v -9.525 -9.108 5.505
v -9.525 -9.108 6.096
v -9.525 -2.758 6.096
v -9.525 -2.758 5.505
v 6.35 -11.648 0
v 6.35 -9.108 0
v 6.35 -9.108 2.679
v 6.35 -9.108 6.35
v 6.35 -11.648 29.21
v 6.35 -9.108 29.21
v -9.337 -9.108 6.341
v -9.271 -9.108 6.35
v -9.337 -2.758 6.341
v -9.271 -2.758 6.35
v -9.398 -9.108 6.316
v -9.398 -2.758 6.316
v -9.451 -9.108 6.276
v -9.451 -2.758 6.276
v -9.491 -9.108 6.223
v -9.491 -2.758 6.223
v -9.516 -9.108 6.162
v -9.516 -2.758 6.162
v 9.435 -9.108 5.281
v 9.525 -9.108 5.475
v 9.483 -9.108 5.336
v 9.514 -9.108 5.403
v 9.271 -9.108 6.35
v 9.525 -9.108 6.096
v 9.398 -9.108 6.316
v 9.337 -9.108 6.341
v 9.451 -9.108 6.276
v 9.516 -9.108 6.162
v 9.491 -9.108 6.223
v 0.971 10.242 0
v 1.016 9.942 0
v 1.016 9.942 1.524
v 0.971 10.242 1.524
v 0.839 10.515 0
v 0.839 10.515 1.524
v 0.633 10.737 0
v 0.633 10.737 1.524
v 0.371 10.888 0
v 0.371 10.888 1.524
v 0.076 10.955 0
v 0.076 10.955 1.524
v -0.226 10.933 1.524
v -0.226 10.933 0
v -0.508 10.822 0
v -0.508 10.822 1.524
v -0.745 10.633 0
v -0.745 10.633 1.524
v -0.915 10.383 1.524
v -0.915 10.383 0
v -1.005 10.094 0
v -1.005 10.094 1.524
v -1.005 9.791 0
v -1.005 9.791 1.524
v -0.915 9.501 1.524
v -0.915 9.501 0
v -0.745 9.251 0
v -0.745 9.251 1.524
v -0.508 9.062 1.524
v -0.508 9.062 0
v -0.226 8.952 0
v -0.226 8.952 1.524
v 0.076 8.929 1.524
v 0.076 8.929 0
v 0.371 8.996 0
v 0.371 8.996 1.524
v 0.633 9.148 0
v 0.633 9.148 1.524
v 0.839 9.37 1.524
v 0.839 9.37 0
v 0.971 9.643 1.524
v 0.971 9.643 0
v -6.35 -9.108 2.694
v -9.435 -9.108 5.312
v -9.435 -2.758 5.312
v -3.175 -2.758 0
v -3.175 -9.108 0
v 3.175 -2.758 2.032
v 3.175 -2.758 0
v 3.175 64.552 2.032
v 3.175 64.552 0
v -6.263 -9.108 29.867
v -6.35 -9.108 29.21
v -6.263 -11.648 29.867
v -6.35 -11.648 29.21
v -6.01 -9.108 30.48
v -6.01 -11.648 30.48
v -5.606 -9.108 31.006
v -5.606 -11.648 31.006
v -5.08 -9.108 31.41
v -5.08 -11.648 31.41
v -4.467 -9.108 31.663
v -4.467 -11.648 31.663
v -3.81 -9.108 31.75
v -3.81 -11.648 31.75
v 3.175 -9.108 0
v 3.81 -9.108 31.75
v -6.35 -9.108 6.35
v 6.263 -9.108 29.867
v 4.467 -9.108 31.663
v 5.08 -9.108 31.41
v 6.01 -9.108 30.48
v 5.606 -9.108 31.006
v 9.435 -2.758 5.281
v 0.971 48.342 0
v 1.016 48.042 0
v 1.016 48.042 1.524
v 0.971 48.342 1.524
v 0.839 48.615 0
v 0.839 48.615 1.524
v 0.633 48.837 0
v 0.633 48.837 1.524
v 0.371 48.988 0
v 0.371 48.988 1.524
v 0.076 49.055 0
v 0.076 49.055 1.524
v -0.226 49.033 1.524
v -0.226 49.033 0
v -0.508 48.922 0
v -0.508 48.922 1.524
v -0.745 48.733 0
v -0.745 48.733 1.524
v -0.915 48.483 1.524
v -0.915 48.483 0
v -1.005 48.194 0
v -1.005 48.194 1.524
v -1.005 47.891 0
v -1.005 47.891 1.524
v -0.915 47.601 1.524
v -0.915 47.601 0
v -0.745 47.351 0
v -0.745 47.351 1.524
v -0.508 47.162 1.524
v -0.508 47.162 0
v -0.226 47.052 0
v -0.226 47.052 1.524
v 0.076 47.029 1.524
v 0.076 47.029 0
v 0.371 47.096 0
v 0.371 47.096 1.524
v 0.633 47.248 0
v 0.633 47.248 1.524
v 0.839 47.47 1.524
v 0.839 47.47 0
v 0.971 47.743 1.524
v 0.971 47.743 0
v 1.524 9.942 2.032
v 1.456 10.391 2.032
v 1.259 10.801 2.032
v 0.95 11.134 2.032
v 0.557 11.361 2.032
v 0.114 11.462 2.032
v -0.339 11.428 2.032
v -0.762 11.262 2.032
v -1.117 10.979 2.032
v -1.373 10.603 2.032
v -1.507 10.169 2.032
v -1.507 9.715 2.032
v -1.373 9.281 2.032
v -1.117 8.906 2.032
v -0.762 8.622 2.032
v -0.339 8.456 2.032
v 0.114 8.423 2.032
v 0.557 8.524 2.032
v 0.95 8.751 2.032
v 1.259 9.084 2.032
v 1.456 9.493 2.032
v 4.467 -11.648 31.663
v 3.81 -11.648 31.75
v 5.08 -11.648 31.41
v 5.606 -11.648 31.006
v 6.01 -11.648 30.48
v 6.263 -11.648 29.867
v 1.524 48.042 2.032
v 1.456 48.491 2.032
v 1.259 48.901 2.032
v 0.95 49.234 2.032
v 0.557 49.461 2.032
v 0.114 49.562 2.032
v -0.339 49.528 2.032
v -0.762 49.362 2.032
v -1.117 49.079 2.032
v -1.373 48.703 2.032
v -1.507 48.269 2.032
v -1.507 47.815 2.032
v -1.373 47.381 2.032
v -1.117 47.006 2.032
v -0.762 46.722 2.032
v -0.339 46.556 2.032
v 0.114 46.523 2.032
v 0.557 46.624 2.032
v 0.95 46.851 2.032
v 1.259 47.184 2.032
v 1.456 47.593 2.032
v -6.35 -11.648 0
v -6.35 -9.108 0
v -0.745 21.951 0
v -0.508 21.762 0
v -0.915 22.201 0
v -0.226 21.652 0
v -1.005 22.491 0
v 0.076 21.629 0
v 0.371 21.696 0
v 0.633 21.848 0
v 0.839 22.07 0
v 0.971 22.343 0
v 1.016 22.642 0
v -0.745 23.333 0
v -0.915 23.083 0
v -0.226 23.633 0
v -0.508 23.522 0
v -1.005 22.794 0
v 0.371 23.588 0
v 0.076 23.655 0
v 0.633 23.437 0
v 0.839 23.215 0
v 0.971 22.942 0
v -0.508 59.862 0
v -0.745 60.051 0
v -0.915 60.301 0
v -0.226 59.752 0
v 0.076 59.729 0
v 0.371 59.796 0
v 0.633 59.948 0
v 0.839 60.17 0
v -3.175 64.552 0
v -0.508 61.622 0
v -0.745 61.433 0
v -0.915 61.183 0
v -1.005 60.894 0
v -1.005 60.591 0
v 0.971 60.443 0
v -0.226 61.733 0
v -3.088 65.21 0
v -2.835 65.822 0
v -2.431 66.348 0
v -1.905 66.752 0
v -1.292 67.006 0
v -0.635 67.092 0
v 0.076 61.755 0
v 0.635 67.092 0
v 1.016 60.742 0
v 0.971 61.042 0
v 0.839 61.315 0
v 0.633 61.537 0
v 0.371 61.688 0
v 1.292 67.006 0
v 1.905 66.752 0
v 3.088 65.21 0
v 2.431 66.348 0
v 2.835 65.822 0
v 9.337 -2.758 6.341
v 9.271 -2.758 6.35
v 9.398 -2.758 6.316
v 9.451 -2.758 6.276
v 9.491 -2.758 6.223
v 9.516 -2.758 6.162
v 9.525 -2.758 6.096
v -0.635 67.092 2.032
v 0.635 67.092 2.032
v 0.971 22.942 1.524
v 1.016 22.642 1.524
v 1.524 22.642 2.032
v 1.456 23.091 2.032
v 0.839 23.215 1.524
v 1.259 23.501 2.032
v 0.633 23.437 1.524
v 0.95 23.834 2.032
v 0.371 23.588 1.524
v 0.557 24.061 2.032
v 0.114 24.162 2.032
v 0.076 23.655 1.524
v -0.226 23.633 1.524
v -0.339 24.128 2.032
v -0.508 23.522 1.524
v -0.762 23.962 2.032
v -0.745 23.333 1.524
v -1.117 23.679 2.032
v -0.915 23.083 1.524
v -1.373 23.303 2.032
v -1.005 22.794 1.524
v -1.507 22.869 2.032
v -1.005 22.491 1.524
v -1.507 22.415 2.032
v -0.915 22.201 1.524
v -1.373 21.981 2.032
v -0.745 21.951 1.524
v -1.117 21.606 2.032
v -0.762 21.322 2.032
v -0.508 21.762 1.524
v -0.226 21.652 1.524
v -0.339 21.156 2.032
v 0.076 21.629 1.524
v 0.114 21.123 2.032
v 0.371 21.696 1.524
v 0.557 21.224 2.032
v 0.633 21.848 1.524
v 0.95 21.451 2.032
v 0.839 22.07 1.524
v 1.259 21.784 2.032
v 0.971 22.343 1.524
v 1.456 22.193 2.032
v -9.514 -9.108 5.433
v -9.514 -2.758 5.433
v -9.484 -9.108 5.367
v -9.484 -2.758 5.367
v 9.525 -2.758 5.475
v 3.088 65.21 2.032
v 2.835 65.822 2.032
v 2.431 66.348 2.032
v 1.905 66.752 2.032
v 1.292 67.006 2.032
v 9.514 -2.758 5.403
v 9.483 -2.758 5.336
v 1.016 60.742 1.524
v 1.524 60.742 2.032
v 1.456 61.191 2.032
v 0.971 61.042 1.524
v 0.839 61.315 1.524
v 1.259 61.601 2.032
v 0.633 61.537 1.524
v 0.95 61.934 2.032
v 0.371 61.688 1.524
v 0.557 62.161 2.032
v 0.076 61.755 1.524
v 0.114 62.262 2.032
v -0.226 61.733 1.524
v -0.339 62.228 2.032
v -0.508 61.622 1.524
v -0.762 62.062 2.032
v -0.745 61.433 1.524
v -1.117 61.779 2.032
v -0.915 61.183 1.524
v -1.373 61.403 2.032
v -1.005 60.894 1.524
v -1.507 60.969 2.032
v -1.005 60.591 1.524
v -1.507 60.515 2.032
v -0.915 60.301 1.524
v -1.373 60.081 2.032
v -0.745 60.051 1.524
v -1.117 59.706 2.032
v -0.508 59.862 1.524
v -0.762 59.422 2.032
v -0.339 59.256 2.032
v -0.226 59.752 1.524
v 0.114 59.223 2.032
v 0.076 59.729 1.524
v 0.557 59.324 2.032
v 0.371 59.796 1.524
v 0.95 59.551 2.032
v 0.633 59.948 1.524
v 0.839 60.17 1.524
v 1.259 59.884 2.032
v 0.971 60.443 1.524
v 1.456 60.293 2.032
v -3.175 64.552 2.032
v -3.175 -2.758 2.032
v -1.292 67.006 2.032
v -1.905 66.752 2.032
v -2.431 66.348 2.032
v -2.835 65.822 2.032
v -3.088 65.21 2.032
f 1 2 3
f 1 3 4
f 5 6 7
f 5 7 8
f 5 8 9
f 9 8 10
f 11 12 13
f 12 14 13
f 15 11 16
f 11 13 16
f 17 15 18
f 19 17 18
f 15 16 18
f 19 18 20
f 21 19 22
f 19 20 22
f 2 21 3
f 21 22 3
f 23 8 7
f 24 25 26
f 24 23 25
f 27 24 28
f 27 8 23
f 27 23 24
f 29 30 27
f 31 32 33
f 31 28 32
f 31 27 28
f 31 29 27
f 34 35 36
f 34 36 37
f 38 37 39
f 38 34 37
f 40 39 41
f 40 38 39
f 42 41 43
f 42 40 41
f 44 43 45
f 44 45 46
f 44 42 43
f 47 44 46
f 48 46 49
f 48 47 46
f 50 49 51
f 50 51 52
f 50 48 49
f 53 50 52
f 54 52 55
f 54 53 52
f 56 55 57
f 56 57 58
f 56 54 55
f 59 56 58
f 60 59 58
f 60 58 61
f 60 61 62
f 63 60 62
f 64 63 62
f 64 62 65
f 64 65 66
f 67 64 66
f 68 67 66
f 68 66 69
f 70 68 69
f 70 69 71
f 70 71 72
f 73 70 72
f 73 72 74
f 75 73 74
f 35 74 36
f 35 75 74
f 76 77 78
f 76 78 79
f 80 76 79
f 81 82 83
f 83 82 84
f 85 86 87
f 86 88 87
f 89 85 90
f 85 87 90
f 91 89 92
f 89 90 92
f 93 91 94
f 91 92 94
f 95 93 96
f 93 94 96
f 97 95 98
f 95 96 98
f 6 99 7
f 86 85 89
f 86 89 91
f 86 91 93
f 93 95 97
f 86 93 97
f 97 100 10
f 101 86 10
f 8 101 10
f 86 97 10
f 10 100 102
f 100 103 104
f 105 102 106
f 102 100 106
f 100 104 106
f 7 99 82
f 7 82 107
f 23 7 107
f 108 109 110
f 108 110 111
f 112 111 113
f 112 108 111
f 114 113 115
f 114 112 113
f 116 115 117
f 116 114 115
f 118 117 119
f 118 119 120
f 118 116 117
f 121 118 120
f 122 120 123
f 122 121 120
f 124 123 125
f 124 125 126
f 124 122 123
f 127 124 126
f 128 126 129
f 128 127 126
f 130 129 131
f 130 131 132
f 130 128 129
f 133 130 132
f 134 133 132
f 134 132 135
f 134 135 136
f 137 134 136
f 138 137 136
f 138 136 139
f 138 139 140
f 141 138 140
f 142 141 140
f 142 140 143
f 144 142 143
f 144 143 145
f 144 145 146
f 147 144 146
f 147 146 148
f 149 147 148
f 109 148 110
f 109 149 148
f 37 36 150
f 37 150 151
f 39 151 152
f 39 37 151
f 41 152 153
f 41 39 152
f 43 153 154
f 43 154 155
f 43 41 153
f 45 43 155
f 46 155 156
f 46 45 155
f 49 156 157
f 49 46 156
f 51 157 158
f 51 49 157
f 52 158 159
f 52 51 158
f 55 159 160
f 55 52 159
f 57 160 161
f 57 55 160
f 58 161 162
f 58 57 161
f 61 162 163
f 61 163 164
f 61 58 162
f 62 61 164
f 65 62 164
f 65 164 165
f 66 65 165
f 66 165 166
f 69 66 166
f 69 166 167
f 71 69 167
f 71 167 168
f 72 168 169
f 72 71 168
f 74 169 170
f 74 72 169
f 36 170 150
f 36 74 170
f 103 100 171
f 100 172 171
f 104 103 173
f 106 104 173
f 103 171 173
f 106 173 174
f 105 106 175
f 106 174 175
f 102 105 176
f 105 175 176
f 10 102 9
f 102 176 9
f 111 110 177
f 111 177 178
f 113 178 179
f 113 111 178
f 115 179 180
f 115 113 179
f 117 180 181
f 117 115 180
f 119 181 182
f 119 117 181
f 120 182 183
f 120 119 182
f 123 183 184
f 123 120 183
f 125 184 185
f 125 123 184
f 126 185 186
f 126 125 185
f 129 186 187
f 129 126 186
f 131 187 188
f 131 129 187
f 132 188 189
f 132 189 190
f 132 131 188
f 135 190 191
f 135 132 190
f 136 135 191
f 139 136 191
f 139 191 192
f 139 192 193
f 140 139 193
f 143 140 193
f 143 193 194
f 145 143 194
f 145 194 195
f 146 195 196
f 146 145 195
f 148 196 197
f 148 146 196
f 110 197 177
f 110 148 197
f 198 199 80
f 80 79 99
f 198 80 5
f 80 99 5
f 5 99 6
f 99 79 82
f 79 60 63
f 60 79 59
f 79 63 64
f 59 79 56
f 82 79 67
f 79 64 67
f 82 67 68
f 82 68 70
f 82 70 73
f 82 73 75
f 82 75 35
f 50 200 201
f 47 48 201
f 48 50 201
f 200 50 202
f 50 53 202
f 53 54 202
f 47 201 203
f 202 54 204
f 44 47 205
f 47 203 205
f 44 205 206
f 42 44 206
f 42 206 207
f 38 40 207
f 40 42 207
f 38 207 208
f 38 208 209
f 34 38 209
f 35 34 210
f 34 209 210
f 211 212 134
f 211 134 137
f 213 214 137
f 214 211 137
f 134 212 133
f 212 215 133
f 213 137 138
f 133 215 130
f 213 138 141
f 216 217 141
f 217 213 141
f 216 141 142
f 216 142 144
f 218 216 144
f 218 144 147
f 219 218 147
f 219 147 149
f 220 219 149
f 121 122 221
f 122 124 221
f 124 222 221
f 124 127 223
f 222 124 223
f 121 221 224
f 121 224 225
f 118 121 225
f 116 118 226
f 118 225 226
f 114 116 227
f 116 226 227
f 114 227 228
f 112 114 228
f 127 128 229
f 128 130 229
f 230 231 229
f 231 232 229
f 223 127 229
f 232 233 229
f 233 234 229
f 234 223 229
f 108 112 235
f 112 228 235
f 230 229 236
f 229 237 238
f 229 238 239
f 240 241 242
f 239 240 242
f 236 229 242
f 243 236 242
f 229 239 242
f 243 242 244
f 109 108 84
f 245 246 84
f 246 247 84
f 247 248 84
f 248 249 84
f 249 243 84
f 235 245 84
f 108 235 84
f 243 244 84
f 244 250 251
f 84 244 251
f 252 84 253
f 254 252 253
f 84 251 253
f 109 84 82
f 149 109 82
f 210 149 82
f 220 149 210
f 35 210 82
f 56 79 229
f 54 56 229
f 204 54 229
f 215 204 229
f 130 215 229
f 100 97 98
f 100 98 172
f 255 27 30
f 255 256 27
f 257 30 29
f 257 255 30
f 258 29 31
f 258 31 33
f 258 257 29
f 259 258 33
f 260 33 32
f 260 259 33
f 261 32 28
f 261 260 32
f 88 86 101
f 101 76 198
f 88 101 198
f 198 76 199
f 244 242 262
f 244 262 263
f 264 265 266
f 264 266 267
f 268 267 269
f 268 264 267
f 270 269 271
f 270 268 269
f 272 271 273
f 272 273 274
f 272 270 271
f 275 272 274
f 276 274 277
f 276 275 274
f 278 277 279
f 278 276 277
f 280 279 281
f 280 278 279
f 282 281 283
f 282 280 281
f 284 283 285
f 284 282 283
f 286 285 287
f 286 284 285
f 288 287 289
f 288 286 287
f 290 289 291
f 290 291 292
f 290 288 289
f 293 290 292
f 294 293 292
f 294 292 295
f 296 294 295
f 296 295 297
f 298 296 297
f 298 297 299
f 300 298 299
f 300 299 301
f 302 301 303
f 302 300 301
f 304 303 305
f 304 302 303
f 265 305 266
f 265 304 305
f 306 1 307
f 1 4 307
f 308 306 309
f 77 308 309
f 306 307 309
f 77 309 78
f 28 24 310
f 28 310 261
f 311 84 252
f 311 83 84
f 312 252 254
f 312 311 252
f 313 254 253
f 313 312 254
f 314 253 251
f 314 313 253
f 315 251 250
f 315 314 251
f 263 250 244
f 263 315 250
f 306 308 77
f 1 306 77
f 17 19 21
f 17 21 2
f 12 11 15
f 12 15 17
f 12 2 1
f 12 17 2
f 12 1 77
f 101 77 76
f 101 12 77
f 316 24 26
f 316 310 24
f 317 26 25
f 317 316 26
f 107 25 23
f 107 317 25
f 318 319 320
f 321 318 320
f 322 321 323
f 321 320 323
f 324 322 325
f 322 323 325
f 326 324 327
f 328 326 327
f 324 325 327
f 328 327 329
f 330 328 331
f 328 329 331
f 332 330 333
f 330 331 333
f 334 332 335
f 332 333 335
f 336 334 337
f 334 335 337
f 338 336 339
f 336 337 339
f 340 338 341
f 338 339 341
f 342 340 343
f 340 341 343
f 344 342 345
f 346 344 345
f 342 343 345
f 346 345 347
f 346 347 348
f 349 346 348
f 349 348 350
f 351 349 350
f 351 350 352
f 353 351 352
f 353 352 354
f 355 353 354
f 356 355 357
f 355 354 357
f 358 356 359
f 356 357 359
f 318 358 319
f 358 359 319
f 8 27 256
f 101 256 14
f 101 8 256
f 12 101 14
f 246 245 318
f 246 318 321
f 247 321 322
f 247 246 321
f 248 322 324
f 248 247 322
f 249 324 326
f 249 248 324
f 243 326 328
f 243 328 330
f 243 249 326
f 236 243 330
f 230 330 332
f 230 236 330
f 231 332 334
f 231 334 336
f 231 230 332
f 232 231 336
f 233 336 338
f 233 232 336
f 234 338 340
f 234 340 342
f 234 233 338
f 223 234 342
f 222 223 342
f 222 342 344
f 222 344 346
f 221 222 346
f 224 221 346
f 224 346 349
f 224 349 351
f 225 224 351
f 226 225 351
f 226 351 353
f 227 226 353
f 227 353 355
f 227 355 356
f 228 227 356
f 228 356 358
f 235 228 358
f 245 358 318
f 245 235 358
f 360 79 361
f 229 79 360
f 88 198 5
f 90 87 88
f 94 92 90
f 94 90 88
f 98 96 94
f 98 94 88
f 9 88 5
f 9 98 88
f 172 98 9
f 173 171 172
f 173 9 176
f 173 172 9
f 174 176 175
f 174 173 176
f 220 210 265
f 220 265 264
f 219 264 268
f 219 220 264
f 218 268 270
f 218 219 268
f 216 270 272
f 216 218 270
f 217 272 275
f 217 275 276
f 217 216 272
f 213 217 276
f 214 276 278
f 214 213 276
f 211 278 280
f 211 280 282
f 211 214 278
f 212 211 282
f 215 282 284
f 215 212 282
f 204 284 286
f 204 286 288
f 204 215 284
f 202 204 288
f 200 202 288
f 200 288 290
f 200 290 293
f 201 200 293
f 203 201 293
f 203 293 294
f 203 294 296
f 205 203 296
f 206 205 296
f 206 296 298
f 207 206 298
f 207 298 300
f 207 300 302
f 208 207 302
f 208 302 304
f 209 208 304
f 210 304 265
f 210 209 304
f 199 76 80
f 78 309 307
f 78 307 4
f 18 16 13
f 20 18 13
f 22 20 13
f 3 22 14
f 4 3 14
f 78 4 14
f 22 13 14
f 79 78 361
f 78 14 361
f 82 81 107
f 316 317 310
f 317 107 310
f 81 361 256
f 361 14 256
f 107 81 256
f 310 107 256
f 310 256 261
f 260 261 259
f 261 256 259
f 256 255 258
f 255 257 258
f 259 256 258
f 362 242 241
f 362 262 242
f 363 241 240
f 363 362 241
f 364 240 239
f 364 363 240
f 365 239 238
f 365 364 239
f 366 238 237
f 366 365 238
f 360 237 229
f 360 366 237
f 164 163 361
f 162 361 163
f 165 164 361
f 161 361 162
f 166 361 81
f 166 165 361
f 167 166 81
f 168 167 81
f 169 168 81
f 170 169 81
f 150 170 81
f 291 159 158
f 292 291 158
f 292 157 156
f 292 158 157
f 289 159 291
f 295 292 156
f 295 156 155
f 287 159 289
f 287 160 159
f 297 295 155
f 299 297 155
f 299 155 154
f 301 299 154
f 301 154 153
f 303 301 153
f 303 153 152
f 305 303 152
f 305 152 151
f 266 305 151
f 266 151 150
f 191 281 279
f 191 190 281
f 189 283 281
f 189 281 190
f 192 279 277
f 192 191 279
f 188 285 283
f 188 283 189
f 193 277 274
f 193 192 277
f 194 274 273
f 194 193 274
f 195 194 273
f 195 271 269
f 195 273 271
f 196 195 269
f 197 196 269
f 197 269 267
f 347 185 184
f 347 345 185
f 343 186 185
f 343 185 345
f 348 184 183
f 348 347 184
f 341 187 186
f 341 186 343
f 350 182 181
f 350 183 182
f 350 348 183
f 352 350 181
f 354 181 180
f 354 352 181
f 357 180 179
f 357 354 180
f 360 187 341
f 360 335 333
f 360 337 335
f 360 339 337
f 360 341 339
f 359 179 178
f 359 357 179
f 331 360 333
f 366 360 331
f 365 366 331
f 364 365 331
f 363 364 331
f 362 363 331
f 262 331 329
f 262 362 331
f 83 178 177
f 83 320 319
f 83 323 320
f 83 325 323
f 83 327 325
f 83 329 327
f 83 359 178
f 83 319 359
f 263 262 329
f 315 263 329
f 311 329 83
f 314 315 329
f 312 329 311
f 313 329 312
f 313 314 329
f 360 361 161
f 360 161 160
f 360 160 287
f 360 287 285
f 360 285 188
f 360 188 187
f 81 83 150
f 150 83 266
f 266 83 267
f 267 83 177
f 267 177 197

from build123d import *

# Parameters (mm, degrees)
F0_W     = 6.35
F0_H     = 76.2
F0_R     = 1.016
F1_DEPTH = 2.032
F3_DEPTH = 6.35
F4_R     = 0.254
F5_R     = 0.254
F6_SIZE  = 0.508
F7_SIZE  = 0.508
F8_W     = 12.7
F8_H     = 25.4
F9_DEPTH = 2.54
F10_R    = 2.54
F11_R    = 2.54


with BuildPart() as f1:
    # F0 (on Top) → F1 (new body)
    with BuildSketch(Plane.XY):
        with Locations((0, 28.9922469051)):
            Rectangle(F0_W, F0_H)
        with Locations((0, 9.9422469051)):
            Circle(F0_R, mode=Mode.SUBTRACT)
        with Locations((0, 22.6422469051)):
            Circle(F0_R, mode=Mode.SUBTRACT)
        with Locations((0, 48.0422469051)):
            Circle(F0_R, mode=Mode.SUBTRACT)
        with Locations((0, 60.7422469051)):
            Circle(F0_R, mode=Mode.SUBTRACT)
    extrude(amount=F1_DEPTH)

    # F2 (on face) → F3 (join)
    with BuildSketch(Plane.XZ.offset(9.1077530949)):
        Polygon((-9.525, 5.3878031066), (-3.175, 0), (3.175, 0), (9.525, 5.3573960435), (9.525, 6.35), (3.175, 6.35), (-3.175, 6.35), (-9.525, 6.35), align=None)
    extrude(amount=-F3_DEPTH)

    # F4
    f4_edges = [f1.edges().sort_by_distance(p)[0] for p in [
        (9.525, -5.932753, 6.35),
    ]]
    fillet(f4_edges, radius=F4_R)

    # F5
    f5_edges = [f1.edges().sort_by_distance(p)[0] for p in [
        (9.525, -5.932753, 5.357396),
        (-9.525, -5.932753, 6.35),
        (-9.525, -5.932753, 5.387803),
    ]]
    fillet(f5_edges, radius=F5_R)

    # F6
    f6_edges = [f1.edges().sort_by_distance(p)[0] for p in [
        (-1.016, 60.742247, 2.032),
    ]]
    chamfer(f6_edges, length=F6_SIZE)

    # F7
    f7_edges = [f1.edges().sort_by_distance(p)[0] for p in [
        (-1.016, 48.042247, 2.032),
        (-1.016, 22.642247, 2.032),
        (-1.016, 9.942247, 2.032),
    ]]
    chamfer(f7_edges, length=F7_SIZE)

    # F8 (on face) → F9 (join)
    with BuildSketch(Plane.XZ.offset(9.1077530949)):
        with Locations((0, 19.05)):
            Rectangle(F8_W, F8_H)
        Polygon((6.35, 6.35), (-6.35, 6.35), (-6.35, 2.6939015533), (-3.175, 0), (3.175, 0), (6.35, 2.6786980217), align=None)
        Polygon((6.35, 0), (6.35, 2.6786980217), (3.175, 0), align=None)
        Polygon((-3.175, 0), (-6.35, 2.6939015533), (-6.35, 0), align=None)
    extrude(amount=F9_DEPTH)

    # F10
    f10_edges = [f1.edges().sort_by_distance(p)[0] for p in [
        (6.35, -10.377753, 31.75),
        (-6.35, -10.377753, 31.75),
    ]]
    fillet(f10_edges, radius=F10_R)

    # F11
    f11_edges = [f1.edges().sort_by_distance(p)[0] for p in [
        (-3.175, 67.092247, 1.016),
        (3.175, 67.092247, 1.016),
    ]]
    fillet(f11_edges, radius=F11_R)


solid = f1.part
